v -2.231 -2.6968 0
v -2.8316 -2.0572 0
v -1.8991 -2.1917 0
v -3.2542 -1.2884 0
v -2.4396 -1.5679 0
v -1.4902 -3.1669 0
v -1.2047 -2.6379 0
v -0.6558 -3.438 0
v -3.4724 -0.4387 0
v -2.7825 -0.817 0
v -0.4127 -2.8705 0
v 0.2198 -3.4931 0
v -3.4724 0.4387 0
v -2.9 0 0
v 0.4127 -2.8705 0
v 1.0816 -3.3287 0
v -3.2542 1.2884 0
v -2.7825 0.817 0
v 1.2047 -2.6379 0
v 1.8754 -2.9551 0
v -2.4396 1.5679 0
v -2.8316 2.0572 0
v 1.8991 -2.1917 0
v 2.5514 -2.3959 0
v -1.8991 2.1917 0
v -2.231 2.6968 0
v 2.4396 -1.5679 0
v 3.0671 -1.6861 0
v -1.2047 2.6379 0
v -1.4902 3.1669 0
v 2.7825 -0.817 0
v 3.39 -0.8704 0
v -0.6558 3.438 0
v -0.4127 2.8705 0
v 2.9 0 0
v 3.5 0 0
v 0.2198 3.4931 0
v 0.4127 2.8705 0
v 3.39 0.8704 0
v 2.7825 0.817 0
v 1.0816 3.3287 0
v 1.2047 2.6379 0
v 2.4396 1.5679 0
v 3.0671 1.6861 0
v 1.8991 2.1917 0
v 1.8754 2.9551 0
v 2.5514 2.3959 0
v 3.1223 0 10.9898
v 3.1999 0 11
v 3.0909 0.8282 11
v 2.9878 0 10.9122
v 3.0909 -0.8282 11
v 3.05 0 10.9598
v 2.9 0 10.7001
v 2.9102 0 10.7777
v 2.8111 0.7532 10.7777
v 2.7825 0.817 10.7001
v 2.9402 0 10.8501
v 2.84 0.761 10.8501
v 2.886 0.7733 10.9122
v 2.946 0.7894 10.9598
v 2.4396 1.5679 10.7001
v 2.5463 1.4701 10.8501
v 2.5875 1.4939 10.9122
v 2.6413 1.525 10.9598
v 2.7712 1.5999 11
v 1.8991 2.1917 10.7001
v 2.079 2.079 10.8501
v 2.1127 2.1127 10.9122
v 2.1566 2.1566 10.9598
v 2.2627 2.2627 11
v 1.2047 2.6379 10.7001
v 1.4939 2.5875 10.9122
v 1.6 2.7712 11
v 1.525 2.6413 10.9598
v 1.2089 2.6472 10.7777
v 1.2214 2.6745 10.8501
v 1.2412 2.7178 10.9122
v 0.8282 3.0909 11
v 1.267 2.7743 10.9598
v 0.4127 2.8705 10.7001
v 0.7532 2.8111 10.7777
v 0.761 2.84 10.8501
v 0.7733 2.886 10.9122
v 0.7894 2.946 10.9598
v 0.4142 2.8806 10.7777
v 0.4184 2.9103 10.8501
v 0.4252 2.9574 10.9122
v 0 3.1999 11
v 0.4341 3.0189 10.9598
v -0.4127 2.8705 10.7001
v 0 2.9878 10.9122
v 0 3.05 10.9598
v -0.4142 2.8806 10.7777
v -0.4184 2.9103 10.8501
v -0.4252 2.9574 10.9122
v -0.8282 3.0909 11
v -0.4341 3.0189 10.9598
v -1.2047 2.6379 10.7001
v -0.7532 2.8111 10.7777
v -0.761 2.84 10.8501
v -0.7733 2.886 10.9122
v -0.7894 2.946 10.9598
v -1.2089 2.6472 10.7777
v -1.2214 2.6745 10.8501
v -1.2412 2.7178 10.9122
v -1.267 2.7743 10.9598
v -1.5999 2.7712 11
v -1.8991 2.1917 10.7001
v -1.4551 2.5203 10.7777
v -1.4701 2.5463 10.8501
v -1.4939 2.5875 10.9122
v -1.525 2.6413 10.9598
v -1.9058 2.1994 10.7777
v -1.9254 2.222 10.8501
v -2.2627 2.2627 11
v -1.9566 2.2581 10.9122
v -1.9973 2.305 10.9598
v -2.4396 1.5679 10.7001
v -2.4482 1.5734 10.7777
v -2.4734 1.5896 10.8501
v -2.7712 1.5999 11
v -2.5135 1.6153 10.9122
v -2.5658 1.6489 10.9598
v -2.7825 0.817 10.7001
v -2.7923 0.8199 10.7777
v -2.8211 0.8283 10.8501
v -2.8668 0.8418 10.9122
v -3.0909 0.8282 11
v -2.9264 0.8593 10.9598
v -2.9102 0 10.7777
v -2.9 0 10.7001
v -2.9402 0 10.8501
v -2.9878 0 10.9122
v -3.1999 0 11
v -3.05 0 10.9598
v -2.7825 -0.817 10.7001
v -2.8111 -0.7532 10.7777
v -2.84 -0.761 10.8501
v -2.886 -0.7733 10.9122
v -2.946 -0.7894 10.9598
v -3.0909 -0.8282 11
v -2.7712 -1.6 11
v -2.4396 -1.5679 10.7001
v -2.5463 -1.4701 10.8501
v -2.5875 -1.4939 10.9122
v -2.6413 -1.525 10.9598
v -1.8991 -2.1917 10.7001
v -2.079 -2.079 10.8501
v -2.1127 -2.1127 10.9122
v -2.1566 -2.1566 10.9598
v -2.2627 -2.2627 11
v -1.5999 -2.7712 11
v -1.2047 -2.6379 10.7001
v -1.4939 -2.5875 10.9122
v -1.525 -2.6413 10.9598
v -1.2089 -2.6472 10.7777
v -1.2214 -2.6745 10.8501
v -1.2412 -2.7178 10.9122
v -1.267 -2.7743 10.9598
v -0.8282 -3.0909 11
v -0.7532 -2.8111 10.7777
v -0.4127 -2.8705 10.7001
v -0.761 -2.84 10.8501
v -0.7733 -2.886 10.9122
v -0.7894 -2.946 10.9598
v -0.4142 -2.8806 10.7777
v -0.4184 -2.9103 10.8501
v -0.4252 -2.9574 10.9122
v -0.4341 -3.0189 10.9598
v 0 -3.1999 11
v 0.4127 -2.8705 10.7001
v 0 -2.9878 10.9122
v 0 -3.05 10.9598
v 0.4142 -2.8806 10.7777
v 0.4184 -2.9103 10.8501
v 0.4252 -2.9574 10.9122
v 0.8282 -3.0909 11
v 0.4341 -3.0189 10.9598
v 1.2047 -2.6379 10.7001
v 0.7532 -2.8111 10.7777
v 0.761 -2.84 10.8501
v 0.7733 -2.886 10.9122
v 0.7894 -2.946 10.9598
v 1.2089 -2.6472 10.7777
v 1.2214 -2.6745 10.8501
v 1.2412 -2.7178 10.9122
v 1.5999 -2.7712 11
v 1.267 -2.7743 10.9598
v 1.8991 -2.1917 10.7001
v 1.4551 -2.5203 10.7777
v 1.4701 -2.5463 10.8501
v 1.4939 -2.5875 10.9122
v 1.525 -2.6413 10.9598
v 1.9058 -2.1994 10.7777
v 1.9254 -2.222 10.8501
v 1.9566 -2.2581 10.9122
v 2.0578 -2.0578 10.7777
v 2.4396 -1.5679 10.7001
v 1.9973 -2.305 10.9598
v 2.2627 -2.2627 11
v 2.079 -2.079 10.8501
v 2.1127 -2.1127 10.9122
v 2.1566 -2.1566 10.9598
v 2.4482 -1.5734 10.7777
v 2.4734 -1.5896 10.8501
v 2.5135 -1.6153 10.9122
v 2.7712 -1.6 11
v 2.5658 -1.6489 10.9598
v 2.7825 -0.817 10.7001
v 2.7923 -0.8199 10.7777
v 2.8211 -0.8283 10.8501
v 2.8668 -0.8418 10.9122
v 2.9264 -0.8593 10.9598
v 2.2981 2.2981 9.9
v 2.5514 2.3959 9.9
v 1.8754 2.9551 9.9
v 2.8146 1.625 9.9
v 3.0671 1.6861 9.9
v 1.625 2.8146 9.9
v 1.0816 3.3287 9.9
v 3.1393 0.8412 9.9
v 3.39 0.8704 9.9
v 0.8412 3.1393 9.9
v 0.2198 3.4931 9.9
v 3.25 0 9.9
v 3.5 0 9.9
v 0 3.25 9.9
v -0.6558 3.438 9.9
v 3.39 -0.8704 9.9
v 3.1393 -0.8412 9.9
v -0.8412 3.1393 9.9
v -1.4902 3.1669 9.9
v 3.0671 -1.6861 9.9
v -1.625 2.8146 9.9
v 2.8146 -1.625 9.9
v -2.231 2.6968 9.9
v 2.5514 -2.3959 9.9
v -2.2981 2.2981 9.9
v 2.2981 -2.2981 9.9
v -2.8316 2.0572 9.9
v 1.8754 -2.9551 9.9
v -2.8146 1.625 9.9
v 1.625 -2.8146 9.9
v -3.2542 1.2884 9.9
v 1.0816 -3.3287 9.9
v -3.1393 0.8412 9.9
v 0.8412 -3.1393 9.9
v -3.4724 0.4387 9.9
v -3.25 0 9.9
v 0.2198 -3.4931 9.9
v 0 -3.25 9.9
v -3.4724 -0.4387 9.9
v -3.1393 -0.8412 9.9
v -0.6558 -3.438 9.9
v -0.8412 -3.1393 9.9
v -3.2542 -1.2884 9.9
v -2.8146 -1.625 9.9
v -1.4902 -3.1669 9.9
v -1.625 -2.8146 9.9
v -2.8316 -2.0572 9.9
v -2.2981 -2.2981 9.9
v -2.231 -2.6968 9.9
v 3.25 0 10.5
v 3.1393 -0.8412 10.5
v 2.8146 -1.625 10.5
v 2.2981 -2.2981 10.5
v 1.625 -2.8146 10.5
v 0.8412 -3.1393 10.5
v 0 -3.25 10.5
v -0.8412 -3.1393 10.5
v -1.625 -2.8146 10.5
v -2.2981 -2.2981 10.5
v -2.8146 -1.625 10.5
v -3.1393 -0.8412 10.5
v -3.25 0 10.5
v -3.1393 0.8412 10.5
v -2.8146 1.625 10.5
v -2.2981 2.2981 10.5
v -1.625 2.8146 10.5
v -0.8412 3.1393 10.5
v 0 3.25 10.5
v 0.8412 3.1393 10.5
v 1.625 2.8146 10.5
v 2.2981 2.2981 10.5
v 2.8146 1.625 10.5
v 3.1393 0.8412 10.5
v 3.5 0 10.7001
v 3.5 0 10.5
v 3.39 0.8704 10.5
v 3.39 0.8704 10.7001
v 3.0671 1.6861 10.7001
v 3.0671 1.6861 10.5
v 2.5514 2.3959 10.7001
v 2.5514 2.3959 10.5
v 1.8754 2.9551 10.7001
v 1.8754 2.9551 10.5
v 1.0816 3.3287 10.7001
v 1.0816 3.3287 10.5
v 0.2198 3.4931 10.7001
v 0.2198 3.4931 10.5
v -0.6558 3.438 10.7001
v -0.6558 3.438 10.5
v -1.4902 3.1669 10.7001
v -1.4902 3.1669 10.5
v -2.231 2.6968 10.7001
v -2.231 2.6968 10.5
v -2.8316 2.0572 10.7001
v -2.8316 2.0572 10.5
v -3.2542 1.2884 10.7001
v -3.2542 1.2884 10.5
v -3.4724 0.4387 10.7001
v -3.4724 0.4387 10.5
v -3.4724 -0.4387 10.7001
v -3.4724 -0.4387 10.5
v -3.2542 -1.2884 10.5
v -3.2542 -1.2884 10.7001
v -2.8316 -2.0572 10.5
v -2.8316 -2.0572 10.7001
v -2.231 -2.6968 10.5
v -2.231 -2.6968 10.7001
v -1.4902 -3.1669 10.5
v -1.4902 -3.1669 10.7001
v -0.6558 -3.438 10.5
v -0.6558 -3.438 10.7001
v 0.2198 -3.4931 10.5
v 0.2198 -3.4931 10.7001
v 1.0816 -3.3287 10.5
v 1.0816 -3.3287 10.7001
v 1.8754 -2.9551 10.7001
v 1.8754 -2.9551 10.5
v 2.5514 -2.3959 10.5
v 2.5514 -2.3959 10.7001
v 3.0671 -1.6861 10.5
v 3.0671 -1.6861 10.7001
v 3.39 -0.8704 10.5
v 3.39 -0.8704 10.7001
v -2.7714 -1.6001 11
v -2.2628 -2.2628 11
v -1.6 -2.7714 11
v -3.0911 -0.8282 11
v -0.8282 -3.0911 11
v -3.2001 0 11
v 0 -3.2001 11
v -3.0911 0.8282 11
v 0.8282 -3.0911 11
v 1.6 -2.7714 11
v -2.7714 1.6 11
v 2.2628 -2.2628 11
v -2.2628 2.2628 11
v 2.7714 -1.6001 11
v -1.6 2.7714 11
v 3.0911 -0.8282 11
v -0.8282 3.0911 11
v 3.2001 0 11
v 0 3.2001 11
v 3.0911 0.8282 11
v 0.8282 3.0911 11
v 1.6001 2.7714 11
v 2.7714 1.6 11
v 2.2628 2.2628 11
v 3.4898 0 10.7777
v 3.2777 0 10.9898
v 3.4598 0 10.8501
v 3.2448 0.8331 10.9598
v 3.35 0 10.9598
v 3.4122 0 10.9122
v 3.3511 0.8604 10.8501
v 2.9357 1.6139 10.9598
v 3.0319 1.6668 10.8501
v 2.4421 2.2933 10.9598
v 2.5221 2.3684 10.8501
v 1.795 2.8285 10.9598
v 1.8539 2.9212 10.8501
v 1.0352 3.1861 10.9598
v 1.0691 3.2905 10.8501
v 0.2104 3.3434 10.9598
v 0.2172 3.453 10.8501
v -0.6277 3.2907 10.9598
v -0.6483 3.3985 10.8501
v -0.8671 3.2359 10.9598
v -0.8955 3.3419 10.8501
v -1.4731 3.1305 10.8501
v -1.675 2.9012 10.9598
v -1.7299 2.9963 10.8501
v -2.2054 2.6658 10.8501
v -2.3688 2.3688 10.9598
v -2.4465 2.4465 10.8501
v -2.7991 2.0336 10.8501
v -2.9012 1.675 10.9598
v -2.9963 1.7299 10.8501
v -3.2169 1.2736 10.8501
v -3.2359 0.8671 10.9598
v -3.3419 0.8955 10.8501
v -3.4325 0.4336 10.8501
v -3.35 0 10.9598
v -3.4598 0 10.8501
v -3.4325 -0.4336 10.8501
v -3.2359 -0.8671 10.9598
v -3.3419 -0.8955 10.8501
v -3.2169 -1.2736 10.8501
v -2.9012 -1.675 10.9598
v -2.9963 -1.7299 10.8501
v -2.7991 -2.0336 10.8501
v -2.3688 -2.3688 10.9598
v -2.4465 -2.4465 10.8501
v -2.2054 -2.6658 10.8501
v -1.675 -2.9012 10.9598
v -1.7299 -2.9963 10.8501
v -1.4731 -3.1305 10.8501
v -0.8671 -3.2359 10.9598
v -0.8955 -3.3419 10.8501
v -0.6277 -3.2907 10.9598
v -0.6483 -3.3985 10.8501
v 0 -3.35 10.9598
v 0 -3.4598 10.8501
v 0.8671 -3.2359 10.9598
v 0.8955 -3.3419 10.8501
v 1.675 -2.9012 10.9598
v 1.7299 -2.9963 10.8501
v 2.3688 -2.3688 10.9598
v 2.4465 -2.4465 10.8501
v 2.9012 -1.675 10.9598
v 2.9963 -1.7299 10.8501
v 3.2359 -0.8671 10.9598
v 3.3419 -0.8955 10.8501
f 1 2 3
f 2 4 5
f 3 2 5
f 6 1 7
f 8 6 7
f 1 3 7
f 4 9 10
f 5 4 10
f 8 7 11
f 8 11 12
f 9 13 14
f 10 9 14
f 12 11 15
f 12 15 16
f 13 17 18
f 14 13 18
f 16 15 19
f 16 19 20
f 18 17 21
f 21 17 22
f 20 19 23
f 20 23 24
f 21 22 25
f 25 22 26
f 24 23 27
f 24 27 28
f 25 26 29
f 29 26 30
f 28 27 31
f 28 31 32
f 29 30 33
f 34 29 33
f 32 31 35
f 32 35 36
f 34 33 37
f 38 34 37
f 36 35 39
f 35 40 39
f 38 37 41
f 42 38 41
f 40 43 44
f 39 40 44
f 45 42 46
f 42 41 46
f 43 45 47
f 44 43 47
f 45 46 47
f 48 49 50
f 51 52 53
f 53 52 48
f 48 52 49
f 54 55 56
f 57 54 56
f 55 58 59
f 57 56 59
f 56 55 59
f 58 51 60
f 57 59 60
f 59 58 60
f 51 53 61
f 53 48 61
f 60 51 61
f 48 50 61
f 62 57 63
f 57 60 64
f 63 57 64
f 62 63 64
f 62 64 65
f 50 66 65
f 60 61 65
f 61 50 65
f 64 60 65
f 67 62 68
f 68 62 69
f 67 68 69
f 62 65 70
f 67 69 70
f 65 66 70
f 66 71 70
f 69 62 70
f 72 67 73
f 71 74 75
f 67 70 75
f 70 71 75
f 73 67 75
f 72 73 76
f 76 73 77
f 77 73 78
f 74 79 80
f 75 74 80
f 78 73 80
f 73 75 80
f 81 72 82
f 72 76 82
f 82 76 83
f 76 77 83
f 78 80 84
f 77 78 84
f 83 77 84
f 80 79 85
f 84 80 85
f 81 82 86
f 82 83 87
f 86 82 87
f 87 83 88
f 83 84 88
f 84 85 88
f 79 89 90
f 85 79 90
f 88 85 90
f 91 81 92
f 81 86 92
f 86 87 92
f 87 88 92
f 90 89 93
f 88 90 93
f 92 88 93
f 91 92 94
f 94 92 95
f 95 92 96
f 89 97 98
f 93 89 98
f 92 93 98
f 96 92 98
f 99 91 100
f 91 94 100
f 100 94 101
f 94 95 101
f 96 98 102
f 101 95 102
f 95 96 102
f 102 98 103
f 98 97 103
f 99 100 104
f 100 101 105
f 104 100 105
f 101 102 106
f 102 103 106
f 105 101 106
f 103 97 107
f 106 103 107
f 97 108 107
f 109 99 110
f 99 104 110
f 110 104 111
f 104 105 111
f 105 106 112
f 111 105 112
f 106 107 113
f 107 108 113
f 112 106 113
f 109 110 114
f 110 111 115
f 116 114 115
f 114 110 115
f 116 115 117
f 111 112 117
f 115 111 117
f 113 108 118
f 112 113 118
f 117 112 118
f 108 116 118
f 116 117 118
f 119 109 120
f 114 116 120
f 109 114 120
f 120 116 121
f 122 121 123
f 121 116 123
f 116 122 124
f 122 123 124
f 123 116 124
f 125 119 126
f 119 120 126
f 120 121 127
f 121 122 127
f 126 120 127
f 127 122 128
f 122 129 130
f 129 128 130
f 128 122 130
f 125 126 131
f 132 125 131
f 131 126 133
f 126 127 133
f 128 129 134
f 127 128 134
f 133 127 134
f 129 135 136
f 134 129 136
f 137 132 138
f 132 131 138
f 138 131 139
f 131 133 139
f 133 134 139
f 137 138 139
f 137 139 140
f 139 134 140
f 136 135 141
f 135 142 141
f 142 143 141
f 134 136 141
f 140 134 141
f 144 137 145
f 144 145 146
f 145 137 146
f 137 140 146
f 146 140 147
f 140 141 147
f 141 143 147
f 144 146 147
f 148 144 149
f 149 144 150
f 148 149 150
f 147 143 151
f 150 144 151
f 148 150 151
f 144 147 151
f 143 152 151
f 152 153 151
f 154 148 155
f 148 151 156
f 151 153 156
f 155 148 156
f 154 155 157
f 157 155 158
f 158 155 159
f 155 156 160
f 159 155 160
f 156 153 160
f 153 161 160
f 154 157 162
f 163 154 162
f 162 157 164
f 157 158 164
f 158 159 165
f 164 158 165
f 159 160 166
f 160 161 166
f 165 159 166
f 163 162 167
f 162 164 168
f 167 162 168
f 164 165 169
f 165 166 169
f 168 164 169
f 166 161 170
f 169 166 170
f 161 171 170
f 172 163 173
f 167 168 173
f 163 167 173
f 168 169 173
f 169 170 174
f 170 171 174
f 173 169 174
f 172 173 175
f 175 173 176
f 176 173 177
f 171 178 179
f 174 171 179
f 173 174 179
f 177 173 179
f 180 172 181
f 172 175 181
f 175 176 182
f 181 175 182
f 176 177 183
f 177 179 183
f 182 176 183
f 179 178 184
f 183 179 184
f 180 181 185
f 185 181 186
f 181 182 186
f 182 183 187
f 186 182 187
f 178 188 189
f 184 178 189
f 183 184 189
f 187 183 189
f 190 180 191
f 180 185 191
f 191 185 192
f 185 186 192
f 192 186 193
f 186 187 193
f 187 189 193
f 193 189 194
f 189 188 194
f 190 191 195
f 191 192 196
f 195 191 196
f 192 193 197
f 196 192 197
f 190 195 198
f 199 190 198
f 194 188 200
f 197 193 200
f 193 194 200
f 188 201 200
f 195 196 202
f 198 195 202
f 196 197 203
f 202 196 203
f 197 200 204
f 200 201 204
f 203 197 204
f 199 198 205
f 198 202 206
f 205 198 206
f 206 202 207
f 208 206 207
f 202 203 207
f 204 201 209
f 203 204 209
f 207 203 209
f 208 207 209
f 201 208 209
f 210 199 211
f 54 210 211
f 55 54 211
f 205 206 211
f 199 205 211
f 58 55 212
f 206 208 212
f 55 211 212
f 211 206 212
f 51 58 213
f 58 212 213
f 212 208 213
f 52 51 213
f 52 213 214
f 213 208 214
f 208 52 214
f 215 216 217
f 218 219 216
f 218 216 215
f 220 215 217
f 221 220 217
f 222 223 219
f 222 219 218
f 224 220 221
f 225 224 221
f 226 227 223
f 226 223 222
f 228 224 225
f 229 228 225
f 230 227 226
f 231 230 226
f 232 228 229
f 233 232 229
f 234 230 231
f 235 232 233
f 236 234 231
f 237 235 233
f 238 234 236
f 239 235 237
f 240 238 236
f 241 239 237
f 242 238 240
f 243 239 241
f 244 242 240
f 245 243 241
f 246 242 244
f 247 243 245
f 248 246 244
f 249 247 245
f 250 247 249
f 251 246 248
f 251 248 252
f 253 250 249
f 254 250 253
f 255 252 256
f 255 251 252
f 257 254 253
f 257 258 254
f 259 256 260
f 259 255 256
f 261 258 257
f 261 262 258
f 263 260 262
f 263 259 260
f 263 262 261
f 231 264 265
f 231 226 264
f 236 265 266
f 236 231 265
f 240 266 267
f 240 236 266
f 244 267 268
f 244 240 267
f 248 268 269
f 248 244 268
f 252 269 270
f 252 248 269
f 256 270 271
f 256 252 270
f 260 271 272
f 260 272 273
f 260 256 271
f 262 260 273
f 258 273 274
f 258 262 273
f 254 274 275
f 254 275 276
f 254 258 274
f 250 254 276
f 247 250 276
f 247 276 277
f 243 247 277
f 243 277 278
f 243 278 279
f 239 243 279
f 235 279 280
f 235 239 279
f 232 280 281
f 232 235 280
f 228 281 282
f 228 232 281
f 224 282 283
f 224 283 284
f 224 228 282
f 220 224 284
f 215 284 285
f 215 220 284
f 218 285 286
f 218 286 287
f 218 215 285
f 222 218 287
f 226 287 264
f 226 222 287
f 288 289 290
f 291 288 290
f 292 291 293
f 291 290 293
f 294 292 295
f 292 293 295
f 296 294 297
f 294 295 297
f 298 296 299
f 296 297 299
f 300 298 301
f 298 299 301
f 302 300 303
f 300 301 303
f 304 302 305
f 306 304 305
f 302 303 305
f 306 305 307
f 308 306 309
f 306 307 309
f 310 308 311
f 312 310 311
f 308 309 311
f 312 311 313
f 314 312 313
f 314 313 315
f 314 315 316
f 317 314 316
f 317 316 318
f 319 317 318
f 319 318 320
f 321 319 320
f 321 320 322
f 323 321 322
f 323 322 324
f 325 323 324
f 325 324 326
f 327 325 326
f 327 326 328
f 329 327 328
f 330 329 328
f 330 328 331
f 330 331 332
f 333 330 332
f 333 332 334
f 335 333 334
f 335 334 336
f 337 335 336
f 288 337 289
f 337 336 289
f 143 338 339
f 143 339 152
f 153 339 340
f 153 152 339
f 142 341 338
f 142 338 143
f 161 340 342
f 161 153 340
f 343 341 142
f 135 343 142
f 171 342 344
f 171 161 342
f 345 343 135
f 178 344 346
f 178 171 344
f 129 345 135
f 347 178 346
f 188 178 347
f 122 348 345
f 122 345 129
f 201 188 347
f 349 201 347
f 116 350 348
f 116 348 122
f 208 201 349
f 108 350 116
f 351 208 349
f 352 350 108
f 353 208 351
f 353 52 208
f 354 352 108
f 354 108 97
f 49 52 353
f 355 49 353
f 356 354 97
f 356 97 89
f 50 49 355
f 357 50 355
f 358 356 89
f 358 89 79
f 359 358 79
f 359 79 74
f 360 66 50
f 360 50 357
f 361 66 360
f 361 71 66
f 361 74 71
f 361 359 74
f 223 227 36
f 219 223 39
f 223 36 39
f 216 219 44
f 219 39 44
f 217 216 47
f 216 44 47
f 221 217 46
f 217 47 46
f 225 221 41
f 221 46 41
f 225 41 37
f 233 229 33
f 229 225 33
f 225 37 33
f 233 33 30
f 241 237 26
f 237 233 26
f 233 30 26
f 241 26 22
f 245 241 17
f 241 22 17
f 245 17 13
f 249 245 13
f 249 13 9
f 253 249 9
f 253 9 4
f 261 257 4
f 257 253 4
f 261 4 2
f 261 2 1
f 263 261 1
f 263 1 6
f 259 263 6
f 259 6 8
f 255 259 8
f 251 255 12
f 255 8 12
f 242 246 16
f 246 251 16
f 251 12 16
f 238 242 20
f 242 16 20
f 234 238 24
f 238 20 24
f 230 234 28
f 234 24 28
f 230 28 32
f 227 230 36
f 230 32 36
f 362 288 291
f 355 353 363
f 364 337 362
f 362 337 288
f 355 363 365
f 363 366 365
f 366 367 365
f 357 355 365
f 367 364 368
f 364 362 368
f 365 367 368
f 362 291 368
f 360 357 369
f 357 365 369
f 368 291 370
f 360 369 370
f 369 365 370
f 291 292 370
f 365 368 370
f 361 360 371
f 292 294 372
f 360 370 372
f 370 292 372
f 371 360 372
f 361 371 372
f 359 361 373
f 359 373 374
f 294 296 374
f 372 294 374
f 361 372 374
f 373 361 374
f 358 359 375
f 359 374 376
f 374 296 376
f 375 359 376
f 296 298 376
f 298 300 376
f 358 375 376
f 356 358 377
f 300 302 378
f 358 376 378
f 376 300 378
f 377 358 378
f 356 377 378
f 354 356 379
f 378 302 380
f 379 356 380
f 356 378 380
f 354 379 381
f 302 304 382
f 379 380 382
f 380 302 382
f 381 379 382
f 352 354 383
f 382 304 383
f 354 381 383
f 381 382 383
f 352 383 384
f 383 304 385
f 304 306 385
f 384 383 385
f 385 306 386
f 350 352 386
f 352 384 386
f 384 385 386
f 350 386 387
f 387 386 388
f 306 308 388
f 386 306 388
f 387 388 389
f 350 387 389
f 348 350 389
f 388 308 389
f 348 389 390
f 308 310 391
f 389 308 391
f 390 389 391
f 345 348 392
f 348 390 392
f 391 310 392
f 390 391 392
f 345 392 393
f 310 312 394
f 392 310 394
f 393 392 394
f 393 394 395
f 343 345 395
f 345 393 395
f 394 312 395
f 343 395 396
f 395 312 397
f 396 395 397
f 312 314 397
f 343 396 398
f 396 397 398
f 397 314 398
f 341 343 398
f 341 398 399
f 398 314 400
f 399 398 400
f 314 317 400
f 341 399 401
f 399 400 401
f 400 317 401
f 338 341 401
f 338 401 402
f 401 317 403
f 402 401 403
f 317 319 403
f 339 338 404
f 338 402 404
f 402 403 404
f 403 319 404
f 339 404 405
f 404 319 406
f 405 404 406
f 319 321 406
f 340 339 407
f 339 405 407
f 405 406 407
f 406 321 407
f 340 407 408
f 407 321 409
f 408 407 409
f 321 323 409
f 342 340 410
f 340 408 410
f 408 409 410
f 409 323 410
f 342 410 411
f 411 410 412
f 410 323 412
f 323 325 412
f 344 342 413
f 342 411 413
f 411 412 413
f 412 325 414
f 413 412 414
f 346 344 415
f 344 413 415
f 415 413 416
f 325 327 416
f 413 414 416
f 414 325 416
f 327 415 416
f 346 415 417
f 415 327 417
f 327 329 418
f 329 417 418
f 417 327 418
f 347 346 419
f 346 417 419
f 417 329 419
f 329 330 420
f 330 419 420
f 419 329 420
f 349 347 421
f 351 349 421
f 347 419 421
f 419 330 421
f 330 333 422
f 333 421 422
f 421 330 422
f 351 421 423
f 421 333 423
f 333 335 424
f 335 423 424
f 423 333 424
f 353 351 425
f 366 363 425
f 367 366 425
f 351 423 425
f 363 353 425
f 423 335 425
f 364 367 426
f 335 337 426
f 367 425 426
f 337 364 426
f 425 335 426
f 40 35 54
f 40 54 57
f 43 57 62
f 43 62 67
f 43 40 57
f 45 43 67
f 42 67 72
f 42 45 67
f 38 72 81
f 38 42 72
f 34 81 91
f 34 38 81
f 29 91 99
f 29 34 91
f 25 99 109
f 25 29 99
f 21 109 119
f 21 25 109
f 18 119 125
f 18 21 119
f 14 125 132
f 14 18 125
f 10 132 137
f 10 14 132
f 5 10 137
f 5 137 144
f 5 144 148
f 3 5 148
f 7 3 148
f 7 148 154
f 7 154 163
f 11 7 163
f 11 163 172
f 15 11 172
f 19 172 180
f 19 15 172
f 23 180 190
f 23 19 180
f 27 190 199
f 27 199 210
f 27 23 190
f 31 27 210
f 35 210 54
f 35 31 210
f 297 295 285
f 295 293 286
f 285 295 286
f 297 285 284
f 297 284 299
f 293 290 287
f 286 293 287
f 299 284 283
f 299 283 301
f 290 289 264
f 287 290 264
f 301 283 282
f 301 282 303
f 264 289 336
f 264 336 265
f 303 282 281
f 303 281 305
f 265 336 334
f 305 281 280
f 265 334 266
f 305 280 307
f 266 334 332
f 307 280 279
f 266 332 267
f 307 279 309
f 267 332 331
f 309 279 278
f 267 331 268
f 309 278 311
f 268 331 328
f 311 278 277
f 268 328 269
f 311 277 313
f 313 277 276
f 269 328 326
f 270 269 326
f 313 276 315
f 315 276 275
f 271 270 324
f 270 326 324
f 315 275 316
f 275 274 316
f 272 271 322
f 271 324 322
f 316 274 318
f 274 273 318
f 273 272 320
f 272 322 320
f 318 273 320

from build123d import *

# Parameters (mm, degrees)
ESQUISSE1_R          = 3.5
ESQUISSE1_R_2        = 2.9
BASE_EXTRUSION_DEPTH = 11
ESQUISSE2_W          = 0.6
ESQUISSE2_H          = 0.25
CONG_3_R             = 0.3


with BuildPart() as part:
    # Esquisse1 → Base-Extrusion (new body)
    with BuildSketch(Plane.XY):
        Circle(ESQUISSE1_R)
        Circle(ESQUISSE1_R_2, mode=Mode.SUBTRACT)
    extrude(amount=BASE_EXTRUSION_DEPTH)

    # Esquisse2 → Enlèvement de matière-Révolution1 (revolve, cut)
    with BuildSketch(Plane(origin=(0, 0, 0), x_dir=(0, 0, -1), z_dir=(1, 0, 0)), mode=Mode.PRIVATE) as enl_vement_de_mati_re_r_volution1_sk:
        with Locations((-10.2, 3.375)):
            Rectangle(ESQUISSE2_W, ESQUISSE2_H)
    revolve(enl_vement_de_mati_re_r_volution1_sk.sketch.rotate(Axis((0, 0, 10), (0, 0, -1)), 90), axis=Axis((0, 0, 10), (0, 0, -1)), mode=Mode.SUBTRACT)

    # Congé3
    cong_3_edges = [part.edges().sort_by_distance(p)[0] for p in [
        (-2.9, 0, 11),
        (-3.5, 0, 11),
    ]]
    fillet(cong_3_edges, radius=CONG_3_R - 0.0001)  # a hair under: the kernel refuses the full size


solid = part.part
